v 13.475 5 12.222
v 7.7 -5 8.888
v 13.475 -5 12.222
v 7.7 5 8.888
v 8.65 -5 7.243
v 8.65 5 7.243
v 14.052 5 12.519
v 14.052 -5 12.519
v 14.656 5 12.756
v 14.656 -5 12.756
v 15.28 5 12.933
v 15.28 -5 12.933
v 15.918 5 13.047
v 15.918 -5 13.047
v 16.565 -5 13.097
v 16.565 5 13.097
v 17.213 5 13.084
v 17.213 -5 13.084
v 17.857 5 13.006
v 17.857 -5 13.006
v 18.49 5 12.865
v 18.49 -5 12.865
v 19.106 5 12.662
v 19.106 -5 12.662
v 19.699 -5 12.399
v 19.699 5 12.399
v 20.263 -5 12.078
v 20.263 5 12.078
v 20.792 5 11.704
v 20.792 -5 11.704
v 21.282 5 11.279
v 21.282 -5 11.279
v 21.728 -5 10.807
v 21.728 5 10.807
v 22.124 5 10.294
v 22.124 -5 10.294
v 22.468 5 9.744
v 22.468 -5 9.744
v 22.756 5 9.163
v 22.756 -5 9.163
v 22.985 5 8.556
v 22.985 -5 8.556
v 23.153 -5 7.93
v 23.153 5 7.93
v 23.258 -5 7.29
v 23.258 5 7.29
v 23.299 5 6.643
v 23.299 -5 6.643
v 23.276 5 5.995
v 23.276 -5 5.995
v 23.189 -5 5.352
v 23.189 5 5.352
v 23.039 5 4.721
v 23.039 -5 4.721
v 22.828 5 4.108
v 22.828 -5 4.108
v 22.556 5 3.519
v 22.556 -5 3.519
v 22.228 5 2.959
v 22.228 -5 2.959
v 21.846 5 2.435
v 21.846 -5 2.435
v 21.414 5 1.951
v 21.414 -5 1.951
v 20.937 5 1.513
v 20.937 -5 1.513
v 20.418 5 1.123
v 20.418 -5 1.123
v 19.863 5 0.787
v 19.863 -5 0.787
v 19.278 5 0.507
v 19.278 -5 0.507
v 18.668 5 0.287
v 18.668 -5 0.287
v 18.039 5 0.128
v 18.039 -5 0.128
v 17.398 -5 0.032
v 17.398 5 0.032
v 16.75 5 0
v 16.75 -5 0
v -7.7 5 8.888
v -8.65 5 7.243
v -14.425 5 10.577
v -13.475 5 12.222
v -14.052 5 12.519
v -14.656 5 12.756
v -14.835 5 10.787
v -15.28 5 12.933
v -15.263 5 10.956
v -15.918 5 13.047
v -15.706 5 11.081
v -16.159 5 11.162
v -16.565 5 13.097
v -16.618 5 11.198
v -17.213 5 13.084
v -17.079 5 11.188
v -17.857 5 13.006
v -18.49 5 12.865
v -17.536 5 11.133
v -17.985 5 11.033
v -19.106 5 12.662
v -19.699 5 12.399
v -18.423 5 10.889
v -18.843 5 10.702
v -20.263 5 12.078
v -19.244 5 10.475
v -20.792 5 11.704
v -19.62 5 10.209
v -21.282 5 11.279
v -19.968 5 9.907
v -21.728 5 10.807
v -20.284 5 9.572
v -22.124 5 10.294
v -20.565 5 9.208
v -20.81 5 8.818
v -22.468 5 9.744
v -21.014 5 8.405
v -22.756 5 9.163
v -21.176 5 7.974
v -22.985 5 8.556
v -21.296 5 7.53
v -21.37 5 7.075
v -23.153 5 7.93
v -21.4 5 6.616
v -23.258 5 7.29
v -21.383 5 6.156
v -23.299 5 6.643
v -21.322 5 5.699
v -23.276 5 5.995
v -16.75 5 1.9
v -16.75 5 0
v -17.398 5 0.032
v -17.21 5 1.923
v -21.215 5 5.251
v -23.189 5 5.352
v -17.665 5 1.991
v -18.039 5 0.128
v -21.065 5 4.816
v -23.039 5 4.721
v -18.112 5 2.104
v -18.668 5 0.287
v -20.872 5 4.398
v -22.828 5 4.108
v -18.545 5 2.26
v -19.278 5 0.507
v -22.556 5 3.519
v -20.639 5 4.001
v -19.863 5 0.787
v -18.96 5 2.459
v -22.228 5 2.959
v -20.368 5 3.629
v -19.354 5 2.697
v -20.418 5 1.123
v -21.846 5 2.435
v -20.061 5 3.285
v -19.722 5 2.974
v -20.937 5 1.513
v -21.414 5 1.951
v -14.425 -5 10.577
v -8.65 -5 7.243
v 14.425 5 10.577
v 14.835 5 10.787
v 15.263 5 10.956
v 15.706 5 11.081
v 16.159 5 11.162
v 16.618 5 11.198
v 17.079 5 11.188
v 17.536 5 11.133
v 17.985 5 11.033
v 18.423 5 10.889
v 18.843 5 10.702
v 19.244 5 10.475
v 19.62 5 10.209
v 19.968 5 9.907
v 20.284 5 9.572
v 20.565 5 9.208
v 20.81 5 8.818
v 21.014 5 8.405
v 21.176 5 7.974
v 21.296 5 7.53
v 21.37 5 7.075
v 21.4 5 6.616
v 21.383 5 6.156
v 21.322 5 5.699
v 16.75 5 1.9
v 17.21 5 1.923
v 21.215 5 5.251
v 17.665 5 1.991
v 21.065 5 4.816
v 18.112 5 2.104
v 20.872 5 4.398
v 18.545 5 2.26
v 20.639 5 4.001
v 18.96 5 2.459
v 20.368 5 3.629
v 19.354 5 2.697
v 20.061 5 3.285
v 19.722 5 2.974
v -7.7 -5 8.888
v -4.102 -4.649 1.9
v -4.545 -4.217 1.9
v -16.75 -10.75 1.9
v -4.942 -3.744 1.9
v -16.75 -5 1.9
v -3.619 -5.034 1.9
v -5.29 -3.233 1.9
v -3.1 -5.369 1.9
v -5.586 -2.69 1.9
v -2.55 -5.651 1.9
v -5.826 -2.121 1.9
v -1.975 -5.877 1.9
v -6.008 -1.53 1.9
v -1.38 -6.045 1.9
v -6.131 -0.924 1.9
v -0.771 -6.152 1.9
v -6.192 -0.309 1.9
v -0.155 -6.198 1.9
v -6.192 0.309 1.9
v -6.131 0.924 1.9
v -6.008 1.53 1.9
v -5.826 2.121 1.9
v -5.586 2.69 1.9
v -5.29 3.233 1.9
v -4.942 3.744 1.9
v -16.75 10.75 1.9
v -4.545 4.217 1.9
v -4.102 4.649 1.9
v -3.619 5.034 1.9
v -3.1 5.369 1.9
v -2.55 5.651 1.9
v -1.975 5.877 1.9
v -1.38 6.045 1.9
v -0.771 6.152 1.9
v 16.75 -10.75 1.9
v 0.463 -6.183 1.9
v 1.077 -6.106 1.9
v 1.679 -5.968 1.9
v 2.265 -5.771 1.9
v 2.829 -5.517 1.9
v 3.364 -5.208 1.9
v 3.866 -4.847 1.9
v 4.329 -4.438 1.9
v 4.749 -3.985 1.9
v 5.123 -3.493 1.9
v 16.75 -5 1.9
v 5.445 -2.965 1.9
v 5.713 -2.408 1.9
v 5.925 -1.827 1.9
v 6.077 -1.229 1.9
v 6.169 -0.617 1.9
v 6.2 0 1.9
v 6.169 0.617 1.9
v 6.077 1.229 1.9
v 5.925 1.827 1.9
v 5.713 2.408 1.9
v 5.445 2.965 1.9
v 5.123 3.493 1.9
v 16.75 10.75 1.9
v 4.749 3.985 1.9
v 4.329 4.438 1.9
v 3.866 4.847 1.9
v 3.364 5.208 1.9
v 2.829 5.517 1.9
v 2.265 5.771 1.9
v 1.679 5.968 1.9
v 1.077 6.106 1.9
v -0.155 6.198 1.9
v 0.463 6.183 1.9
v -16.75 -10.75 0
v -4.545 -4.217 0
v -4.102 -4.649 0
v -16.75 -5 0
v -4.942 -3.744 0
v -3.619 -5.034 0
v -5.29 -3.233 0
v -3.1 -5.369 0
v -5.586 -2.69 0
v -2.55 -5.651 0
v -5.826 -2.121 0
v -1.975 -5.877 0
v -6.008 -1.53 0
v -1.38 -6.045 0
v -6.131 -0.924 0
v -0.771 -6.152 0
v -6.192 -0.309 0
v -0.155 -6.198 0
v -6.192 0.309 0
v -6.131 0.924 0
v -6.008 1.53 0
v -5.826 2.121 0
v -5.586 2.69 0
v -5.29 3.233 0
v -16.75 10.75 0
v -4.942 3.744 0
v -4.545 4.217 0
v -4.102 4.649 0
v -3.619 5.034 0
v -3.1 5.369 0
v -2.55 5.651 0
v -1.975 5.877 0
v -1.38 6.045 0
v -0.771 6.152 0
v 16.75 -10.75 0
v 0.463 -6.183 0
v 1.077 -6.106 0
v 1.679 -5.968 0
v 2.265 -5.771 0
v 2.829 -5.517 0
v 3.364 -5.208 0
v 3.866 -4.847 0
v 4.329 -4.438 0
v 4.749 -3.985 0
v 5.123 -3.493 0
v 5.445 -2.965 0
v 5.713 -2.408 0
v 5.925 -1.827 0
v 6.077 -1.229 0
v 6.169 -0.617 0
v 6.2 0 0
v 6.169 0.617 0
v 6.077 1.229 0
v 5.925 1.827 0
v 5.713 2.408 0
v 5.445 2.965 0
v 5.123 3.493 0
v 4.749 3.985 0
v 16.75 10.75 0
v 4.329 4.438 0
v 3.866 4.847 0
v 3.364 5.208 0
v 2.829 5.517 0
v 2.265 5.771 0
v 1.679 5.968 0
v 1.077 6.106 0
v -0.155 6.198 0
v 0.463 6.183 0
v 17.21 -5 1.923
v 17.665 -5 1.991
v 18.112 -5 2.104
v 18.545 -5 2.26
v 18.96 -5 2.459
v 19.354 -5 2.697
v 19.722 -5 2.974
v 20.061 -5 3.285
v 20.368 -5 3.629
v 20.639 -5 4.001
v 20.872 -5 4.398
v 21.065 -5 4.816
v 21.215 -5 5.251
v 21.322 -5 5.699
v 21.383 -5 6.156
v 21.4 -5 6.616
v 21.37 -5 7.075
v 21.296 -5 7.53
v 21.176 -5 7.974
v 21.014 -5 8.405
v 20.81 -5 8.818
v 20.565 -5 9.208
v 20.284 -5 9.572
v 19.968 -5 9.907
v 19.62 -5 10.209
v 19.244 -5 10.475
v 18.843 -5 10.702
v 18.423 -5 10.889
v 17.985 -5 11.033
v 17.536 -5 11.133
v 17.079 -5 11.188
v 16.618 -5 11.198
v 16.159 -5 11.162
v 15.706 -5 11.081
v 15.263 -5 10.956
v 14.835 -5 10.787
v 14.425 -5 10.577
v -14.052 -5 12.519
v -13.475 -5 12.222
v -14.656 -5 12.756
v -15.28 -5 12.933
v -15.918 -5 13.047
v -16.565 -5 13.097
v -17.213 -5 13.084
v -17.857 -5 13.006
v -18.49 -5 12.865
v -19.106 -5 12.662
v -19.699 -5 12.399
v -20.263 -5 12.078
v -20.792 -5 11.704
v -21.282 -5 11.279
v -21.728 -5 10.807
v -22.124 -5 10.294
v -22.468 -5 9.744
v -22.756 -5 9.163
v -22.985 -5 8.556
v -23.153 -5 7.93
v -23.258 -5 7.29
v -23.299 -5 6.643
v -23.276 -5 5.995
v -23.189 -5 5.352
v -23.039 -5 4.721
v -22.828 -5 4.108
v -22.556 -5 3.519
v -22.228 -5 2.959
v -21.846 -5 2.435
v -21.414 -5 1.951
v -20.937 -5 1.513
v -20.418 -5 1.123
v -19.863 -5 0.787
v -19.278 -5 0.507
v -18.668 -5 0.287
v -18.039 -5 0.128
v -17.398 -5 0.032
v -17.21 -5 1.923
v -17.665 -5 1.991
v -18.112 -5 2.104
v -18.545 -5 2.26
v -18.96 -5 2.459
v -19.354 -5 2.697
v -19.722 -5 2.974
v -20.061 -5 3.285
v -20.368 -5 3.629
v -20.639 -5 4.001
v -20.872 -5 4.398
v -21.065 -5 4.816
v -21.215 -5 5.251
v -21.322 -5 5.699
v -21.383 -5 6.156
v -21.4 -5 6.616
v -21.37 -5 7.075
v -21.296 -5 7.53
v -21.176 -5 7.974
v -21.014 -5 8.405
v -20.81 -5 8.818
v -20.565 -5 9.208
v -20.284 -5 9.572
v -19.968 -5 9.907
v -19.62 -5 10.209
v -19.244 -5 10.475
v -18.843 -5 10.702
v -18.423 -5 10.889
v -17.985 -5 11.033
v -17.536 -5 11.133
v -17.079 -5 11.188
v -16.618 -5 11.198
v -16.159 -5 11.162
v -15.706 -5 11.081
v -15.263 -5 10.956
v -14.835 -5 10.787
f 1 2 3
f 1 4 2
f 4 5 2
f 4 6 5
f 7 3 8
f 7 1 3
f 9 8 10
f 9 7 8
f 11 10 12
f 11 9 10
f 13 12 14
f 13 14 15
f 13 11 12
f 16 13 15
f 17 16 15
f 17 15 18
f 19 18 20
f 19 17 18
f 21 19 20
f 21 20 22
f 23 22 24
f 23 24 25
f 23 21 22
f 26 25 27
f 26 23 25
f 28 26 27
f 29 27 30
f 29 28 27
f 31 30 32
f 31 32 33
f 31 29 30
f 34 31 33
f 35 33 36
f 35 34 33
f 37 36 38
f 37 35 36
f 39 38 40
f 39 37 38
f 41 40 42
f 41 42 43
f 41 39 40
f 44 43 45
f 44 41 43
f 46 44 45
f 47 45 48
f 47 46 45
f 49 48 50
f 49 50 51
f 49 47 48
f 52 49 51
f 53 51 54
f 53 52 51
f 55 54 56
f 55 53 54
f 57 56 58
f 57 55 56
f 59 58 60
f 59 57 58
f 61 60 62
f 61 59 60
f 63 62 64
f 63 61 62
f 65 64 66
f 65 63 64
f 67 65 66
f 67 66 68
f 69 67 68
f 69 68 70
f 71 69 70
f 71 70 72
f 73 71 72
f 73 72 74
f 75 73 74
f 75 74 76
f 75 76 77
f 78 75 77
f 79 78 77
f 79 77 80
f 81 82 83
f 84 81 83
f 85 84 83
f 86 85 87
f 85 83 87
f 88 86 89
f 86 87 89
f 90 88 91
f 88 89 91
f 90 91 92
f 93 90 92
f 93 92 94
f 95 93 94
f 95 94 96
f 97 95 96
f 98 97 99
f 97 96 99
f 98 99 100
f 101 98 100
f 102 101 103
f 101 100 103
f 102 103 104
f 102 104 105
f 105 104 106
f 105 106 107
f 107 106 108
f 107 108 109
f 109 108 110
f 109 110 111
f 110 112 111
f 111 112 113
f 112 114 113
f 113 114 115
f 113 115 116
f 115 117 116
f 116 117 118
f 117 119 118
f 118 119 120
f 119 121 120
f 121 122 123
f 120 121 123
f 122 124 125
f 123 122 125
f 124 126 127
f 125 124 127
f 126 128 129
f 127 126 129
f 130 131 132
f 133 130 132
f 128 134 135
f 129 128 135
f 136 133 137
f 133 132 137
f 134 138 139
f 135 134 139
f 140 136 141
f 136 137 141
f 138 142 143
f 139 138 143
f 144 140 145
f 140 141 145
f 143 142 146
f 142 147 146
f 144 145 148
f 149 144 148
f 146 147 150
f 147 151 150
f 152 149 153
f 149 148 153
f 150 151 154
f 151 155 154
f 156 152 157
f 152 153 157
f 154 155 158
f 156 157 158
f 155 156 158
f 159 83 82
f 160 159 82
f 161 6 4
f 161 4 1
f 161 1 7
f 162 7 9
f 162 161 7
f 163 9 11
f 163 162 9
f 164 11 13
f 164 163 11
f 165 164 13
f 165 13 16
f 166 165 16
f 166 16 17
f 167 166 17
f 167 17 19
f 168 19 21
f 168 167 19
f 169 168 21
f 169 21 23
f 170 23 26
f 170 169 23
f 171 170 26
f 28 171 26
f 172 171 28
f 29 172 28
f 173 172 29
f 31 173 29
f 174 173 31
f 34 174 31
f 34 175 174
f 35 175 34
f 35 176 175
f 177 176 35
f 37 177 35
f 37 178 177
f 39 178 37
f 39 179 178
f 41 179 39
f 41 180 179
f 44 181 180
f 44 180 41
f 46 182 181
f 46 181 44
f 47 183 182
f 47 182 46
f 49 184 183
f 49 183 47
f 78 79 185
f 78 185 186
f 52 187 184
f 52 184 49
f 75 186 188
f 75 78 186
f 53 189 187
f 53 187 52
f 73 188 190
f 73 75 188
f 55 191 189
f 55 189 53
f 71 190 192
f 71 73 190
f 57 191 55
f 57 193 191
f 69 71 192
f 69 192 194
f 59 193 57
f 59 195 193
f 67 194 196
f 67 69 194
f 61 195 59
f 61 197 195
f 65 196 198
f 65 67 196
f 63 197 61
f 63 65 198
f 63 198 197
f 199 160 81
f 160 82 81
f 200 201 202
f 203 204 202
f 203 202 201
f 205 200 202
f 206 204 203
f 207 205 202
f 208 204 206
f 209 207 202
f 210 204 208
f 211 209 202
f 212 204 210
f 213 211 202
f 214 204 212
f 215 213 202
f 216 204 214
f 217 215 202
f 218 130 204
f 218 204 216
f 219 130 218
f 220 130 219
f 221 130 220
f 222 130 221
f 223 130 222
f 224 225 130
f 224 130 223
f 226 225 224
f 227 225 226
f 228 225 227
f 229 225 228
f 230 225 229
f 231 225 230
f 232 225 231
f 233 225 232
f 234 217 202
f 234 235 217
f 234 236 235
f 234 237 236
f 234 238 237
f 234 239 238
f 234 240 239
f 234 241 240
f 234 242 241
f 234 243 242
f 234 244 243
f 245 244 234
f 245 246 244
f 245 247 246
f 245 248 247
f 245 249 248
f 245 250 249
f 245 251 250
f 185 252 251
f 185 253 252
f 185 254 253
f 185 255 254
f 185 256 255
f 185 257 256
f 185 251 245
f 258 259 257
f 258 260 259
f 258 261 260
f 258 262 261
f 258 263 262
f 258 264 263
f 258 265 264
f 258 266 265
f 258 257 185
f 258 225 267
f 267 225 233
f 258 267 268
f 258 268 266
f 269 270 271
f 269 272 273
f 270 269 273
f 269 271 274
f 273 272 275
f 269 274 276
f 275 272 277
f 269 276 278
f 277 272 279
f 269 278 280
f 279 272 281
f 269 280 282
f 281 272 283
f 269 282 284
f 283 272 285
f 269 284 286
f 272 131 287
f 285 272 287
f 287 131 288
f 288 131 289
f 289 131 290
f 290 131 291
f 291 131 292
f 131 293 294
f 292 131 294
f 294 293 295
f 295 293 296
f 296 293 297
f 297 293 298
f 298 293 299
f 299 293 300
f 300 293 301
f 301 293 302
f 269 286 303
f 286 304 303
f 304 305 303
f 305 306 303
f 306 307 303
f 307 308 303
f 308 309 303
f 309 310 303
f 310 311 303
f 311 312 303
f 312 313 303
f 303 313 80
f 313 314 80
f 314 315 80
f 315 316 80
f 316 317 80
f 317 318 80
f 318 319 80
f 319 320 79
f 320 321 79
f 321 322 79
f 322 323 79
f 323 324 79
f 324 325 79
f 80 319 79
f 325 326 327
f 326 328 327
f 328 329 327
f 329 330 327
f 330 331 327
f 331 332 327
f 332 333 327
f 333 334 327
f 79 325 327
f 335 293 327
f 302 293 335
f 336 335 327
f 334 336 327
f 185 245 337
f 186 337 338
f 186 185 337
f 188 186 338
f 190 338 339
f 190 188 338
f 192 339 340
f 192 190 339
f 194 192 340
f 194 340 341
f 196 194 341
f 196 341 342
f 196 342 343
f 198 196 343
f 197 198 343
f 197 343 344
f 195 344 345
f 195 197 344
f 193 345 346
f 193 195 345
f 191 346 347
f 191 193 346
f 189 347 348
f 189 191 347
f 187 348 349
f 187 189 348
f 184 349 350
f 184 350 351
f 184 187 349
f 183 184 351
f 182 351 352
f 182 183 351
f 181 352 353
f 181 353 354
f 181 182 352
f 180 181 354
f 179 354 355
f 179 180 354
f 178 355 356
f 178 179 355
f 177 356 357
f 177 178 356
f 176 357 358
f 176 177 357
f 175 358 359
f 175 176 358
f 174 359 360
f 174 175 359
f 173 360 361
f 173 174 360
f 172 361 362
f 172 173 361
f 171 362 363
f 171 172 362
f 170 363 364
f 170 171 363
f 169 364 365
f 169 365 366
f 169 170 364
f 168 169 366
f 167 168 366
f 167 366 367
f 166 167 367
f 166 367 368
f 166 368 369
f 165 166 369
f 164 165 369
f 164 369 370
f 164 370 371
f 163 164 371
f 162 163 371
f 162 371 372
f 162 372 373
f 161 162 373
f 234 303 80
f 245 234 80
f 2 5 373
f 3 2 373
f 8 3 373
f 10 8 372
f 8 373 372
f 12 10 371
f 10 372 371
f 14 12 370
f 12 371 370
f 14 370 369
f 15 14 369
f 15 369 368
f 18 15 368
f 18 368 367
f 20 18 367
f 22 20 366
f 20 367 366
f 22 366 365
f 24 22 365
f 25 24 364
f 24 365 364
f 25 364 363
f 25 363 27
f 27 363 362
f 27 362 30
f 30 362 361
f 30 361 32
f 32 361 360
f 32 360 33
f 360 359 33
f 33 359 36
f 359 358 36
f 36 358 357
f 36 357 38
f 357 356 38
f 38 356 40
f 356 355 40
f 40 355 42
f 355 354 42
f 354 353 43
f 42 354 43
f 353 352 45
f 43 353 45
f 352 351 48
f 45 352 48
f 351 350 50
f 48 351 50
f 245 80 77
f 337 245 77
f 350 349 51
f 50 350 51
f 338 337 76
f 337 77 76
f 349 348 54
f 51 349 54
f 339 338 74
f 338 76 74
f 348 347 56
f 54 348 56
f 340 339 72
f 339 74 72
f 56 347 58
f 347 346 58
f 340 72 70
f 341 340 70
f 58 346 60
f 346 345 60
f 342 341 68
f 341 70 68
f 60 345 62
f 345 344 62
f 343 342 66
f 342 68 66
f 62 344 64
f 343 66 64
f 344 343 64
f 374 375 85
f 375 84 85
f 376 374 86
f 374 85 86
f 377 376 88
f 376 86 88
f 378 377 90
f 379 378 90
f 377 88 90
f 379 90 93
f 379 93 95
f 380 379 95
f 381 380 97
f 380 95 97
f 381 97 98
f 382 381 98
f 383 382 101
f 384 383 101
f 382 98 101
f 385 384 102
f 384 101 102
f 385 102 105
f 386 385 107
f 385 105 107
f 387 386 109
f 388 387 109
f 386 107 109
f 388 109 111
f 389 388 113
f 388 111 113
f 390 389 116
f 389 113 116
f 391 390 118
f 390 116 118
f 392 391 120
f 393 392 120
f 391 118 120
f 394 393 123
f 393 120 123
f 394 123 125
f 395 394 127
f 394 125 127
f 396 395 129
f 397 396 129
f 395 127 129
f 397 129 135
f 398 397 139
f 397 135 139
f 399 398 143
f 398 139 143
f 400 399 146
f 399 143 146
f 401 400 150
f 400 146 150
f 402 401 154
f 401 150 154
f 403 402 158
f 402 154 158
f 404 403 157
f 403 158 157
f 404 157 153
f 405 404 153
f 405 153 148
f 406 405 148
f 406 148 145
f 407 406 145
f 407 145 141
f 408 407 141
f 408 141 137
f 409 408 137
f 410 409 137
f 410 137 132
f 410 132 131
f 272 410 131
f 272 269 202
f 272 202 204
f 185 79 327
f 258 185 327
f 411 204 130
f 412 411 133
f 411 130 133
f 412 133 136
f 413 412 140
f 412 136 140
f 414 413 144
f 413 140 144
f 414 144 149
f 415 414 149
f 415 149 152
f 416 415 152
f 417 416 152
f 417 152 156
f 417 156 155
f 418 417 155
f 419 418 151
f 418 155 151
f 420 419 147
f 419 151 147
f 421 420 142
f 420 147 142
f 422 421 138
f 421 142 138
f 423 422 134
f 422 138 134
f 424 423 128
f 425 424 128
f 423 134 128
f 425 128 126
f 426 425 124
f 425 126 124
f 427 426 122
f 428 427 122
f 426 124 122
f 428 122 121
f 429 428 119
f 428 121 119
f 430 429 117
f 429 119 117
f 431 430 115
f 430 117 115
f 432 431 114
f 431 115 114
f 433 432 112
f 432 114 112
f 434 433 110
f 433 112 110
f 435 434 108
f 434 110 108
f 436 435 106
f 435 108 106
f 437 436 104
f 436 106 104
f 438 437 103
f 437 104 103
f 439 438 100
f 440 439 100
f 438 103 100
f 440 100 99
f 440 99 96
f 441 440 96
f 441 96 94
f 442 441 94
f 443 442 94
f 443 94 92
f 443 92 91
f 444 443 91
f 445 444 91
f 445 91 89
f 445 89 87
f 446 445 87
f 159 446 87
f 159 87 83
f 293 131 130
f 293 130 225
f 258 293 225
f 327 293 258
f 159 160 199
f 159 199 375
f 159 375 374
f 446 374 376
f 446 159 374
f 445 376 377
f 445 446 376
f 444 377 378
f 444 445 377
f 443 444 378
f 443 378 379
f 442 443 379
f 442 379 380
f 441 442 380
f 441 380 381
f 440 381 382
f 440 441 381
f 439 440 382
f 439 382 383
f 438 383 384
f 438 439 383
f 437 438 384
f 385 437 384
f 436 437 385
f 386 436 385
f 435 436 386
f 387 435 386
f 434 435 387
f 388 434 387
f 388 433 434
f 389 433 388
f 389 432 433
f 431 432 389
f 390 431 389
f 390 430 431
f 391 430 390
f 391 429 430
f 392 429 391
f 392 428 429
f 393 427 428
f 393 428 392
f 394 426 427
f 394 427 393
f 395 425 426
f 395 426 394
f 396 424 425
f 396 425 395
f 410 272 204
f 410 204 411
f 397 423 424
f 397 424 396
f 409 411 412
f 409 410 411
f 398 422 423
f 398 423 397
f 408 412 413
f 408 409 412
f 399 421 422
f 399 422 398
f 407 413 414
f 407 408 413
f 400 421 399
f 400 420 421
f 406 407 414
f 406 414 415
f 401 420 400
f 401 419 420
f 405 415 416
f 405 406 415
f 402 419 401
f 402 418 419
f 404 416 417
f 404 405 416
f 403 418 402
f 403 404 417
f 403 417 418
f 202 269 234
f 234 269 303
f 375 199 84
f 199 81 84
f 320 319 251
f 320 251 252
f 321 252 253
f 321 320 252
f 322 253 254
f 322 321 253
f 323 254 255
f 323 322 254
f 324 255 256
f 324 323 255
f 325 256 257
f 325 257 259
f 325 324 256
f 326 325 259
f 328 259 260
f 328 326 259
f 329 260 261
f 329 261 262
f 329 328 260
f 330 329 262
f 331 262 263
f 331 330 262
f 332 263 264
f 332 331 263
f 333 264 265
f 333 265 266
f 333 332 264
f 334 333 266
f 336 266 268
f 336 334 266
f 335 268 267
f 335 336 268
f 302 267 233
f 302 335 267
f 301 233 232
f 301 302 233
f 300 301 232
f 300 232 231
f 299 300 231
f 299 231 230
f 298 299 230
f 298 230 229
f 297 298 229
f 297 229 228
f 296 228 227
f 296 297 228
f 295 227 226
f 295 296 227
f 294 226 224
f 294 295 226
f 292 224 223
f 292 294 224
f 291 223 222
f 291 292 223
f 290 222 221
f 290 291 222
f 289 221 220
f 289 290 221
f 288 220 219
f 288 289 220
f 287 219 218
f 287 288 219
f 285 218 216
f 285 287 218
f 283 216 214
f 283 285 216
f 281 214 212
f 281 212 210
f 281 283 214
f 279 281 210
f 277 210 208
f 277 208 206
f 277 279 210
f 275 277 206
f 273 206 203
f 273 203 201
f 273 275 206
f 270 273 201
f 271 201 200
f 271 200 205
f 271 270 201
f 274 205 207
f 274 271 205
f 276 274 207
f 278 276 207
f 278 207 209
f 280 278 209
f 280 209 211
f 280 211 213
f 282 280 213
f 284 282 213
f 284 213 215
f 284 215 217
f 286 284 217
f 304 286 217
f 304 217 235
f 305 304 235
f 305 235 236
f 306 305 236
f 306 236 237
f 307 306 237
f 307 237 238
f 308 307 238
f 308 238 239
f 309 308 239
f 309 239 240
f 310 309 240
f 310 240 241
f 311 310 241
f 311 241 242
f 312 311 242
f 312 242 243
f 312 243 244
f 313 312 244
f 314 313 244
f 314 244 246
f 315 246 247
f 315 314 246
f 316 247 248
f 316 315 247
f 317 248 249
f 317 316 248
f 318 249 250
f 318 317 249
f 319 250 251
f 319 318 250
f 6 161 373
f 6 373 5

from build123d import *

# Parameters (mm, degrees)
SKETCH_1_W      = 33.5
SKETCH_1_H      = 21.5
SKETCH_1_R      = 6.2
EXTRUDE_1_DEPTH = 1.9
EXTRUDE_2_DEPTH = 5


with BuildPart() as part:
    # Эскиз1 → Бобышка-Вытянуть1 (new body)
    with BuildSketch(Plane.XY):
        Rectangle(SKETCH_1_W, SKETCH_1_H)
        Circle(SKETCH_1_R, mode=Mode.SUBTRACT)
    extrude(amount=EXTRUDE_1_DEPTH)

    # Эскиз3 → Бобышка-Вытянуть2 (add, symmetric)
    with BuildSketch(Plane(origin=(0, 0, 0), x_dir=(1, 0, 0), z_dir=(0, 1, 0))):
        with BuildLine():
            Line((-14.425, -10.577018128), (-8.65, -7.242820323))
            Line((-8.65, -7.242820323), (-7.7, -8.88826859))
            Line((-7.7, -8.88826859), (-13.475, -12.222466395))
            ThreePointArc((-13.475, -12.222466395), (-23.076814162, -8.245264745), (-16.75, 0))
            Line((-16.75, 0), (-16.75, -1.9))
            ThreePointArc((-16.75, -1.9), (-21.241555092, -7.75350856), (-14.425, -10.577018128))
        make_face()
    extrude_2 = extrude(amount=EXTRUDE_2_DEPTH, both=True)

    # Зеркальное отражение1: Бобышка-Вытянуть2 across plane
    add(extrude_2.mirror(Plane(origin=(0, 0, 0), x_dir=(0, 0, 1), z_dir=(1, 0, 0))))


solid = part.part
